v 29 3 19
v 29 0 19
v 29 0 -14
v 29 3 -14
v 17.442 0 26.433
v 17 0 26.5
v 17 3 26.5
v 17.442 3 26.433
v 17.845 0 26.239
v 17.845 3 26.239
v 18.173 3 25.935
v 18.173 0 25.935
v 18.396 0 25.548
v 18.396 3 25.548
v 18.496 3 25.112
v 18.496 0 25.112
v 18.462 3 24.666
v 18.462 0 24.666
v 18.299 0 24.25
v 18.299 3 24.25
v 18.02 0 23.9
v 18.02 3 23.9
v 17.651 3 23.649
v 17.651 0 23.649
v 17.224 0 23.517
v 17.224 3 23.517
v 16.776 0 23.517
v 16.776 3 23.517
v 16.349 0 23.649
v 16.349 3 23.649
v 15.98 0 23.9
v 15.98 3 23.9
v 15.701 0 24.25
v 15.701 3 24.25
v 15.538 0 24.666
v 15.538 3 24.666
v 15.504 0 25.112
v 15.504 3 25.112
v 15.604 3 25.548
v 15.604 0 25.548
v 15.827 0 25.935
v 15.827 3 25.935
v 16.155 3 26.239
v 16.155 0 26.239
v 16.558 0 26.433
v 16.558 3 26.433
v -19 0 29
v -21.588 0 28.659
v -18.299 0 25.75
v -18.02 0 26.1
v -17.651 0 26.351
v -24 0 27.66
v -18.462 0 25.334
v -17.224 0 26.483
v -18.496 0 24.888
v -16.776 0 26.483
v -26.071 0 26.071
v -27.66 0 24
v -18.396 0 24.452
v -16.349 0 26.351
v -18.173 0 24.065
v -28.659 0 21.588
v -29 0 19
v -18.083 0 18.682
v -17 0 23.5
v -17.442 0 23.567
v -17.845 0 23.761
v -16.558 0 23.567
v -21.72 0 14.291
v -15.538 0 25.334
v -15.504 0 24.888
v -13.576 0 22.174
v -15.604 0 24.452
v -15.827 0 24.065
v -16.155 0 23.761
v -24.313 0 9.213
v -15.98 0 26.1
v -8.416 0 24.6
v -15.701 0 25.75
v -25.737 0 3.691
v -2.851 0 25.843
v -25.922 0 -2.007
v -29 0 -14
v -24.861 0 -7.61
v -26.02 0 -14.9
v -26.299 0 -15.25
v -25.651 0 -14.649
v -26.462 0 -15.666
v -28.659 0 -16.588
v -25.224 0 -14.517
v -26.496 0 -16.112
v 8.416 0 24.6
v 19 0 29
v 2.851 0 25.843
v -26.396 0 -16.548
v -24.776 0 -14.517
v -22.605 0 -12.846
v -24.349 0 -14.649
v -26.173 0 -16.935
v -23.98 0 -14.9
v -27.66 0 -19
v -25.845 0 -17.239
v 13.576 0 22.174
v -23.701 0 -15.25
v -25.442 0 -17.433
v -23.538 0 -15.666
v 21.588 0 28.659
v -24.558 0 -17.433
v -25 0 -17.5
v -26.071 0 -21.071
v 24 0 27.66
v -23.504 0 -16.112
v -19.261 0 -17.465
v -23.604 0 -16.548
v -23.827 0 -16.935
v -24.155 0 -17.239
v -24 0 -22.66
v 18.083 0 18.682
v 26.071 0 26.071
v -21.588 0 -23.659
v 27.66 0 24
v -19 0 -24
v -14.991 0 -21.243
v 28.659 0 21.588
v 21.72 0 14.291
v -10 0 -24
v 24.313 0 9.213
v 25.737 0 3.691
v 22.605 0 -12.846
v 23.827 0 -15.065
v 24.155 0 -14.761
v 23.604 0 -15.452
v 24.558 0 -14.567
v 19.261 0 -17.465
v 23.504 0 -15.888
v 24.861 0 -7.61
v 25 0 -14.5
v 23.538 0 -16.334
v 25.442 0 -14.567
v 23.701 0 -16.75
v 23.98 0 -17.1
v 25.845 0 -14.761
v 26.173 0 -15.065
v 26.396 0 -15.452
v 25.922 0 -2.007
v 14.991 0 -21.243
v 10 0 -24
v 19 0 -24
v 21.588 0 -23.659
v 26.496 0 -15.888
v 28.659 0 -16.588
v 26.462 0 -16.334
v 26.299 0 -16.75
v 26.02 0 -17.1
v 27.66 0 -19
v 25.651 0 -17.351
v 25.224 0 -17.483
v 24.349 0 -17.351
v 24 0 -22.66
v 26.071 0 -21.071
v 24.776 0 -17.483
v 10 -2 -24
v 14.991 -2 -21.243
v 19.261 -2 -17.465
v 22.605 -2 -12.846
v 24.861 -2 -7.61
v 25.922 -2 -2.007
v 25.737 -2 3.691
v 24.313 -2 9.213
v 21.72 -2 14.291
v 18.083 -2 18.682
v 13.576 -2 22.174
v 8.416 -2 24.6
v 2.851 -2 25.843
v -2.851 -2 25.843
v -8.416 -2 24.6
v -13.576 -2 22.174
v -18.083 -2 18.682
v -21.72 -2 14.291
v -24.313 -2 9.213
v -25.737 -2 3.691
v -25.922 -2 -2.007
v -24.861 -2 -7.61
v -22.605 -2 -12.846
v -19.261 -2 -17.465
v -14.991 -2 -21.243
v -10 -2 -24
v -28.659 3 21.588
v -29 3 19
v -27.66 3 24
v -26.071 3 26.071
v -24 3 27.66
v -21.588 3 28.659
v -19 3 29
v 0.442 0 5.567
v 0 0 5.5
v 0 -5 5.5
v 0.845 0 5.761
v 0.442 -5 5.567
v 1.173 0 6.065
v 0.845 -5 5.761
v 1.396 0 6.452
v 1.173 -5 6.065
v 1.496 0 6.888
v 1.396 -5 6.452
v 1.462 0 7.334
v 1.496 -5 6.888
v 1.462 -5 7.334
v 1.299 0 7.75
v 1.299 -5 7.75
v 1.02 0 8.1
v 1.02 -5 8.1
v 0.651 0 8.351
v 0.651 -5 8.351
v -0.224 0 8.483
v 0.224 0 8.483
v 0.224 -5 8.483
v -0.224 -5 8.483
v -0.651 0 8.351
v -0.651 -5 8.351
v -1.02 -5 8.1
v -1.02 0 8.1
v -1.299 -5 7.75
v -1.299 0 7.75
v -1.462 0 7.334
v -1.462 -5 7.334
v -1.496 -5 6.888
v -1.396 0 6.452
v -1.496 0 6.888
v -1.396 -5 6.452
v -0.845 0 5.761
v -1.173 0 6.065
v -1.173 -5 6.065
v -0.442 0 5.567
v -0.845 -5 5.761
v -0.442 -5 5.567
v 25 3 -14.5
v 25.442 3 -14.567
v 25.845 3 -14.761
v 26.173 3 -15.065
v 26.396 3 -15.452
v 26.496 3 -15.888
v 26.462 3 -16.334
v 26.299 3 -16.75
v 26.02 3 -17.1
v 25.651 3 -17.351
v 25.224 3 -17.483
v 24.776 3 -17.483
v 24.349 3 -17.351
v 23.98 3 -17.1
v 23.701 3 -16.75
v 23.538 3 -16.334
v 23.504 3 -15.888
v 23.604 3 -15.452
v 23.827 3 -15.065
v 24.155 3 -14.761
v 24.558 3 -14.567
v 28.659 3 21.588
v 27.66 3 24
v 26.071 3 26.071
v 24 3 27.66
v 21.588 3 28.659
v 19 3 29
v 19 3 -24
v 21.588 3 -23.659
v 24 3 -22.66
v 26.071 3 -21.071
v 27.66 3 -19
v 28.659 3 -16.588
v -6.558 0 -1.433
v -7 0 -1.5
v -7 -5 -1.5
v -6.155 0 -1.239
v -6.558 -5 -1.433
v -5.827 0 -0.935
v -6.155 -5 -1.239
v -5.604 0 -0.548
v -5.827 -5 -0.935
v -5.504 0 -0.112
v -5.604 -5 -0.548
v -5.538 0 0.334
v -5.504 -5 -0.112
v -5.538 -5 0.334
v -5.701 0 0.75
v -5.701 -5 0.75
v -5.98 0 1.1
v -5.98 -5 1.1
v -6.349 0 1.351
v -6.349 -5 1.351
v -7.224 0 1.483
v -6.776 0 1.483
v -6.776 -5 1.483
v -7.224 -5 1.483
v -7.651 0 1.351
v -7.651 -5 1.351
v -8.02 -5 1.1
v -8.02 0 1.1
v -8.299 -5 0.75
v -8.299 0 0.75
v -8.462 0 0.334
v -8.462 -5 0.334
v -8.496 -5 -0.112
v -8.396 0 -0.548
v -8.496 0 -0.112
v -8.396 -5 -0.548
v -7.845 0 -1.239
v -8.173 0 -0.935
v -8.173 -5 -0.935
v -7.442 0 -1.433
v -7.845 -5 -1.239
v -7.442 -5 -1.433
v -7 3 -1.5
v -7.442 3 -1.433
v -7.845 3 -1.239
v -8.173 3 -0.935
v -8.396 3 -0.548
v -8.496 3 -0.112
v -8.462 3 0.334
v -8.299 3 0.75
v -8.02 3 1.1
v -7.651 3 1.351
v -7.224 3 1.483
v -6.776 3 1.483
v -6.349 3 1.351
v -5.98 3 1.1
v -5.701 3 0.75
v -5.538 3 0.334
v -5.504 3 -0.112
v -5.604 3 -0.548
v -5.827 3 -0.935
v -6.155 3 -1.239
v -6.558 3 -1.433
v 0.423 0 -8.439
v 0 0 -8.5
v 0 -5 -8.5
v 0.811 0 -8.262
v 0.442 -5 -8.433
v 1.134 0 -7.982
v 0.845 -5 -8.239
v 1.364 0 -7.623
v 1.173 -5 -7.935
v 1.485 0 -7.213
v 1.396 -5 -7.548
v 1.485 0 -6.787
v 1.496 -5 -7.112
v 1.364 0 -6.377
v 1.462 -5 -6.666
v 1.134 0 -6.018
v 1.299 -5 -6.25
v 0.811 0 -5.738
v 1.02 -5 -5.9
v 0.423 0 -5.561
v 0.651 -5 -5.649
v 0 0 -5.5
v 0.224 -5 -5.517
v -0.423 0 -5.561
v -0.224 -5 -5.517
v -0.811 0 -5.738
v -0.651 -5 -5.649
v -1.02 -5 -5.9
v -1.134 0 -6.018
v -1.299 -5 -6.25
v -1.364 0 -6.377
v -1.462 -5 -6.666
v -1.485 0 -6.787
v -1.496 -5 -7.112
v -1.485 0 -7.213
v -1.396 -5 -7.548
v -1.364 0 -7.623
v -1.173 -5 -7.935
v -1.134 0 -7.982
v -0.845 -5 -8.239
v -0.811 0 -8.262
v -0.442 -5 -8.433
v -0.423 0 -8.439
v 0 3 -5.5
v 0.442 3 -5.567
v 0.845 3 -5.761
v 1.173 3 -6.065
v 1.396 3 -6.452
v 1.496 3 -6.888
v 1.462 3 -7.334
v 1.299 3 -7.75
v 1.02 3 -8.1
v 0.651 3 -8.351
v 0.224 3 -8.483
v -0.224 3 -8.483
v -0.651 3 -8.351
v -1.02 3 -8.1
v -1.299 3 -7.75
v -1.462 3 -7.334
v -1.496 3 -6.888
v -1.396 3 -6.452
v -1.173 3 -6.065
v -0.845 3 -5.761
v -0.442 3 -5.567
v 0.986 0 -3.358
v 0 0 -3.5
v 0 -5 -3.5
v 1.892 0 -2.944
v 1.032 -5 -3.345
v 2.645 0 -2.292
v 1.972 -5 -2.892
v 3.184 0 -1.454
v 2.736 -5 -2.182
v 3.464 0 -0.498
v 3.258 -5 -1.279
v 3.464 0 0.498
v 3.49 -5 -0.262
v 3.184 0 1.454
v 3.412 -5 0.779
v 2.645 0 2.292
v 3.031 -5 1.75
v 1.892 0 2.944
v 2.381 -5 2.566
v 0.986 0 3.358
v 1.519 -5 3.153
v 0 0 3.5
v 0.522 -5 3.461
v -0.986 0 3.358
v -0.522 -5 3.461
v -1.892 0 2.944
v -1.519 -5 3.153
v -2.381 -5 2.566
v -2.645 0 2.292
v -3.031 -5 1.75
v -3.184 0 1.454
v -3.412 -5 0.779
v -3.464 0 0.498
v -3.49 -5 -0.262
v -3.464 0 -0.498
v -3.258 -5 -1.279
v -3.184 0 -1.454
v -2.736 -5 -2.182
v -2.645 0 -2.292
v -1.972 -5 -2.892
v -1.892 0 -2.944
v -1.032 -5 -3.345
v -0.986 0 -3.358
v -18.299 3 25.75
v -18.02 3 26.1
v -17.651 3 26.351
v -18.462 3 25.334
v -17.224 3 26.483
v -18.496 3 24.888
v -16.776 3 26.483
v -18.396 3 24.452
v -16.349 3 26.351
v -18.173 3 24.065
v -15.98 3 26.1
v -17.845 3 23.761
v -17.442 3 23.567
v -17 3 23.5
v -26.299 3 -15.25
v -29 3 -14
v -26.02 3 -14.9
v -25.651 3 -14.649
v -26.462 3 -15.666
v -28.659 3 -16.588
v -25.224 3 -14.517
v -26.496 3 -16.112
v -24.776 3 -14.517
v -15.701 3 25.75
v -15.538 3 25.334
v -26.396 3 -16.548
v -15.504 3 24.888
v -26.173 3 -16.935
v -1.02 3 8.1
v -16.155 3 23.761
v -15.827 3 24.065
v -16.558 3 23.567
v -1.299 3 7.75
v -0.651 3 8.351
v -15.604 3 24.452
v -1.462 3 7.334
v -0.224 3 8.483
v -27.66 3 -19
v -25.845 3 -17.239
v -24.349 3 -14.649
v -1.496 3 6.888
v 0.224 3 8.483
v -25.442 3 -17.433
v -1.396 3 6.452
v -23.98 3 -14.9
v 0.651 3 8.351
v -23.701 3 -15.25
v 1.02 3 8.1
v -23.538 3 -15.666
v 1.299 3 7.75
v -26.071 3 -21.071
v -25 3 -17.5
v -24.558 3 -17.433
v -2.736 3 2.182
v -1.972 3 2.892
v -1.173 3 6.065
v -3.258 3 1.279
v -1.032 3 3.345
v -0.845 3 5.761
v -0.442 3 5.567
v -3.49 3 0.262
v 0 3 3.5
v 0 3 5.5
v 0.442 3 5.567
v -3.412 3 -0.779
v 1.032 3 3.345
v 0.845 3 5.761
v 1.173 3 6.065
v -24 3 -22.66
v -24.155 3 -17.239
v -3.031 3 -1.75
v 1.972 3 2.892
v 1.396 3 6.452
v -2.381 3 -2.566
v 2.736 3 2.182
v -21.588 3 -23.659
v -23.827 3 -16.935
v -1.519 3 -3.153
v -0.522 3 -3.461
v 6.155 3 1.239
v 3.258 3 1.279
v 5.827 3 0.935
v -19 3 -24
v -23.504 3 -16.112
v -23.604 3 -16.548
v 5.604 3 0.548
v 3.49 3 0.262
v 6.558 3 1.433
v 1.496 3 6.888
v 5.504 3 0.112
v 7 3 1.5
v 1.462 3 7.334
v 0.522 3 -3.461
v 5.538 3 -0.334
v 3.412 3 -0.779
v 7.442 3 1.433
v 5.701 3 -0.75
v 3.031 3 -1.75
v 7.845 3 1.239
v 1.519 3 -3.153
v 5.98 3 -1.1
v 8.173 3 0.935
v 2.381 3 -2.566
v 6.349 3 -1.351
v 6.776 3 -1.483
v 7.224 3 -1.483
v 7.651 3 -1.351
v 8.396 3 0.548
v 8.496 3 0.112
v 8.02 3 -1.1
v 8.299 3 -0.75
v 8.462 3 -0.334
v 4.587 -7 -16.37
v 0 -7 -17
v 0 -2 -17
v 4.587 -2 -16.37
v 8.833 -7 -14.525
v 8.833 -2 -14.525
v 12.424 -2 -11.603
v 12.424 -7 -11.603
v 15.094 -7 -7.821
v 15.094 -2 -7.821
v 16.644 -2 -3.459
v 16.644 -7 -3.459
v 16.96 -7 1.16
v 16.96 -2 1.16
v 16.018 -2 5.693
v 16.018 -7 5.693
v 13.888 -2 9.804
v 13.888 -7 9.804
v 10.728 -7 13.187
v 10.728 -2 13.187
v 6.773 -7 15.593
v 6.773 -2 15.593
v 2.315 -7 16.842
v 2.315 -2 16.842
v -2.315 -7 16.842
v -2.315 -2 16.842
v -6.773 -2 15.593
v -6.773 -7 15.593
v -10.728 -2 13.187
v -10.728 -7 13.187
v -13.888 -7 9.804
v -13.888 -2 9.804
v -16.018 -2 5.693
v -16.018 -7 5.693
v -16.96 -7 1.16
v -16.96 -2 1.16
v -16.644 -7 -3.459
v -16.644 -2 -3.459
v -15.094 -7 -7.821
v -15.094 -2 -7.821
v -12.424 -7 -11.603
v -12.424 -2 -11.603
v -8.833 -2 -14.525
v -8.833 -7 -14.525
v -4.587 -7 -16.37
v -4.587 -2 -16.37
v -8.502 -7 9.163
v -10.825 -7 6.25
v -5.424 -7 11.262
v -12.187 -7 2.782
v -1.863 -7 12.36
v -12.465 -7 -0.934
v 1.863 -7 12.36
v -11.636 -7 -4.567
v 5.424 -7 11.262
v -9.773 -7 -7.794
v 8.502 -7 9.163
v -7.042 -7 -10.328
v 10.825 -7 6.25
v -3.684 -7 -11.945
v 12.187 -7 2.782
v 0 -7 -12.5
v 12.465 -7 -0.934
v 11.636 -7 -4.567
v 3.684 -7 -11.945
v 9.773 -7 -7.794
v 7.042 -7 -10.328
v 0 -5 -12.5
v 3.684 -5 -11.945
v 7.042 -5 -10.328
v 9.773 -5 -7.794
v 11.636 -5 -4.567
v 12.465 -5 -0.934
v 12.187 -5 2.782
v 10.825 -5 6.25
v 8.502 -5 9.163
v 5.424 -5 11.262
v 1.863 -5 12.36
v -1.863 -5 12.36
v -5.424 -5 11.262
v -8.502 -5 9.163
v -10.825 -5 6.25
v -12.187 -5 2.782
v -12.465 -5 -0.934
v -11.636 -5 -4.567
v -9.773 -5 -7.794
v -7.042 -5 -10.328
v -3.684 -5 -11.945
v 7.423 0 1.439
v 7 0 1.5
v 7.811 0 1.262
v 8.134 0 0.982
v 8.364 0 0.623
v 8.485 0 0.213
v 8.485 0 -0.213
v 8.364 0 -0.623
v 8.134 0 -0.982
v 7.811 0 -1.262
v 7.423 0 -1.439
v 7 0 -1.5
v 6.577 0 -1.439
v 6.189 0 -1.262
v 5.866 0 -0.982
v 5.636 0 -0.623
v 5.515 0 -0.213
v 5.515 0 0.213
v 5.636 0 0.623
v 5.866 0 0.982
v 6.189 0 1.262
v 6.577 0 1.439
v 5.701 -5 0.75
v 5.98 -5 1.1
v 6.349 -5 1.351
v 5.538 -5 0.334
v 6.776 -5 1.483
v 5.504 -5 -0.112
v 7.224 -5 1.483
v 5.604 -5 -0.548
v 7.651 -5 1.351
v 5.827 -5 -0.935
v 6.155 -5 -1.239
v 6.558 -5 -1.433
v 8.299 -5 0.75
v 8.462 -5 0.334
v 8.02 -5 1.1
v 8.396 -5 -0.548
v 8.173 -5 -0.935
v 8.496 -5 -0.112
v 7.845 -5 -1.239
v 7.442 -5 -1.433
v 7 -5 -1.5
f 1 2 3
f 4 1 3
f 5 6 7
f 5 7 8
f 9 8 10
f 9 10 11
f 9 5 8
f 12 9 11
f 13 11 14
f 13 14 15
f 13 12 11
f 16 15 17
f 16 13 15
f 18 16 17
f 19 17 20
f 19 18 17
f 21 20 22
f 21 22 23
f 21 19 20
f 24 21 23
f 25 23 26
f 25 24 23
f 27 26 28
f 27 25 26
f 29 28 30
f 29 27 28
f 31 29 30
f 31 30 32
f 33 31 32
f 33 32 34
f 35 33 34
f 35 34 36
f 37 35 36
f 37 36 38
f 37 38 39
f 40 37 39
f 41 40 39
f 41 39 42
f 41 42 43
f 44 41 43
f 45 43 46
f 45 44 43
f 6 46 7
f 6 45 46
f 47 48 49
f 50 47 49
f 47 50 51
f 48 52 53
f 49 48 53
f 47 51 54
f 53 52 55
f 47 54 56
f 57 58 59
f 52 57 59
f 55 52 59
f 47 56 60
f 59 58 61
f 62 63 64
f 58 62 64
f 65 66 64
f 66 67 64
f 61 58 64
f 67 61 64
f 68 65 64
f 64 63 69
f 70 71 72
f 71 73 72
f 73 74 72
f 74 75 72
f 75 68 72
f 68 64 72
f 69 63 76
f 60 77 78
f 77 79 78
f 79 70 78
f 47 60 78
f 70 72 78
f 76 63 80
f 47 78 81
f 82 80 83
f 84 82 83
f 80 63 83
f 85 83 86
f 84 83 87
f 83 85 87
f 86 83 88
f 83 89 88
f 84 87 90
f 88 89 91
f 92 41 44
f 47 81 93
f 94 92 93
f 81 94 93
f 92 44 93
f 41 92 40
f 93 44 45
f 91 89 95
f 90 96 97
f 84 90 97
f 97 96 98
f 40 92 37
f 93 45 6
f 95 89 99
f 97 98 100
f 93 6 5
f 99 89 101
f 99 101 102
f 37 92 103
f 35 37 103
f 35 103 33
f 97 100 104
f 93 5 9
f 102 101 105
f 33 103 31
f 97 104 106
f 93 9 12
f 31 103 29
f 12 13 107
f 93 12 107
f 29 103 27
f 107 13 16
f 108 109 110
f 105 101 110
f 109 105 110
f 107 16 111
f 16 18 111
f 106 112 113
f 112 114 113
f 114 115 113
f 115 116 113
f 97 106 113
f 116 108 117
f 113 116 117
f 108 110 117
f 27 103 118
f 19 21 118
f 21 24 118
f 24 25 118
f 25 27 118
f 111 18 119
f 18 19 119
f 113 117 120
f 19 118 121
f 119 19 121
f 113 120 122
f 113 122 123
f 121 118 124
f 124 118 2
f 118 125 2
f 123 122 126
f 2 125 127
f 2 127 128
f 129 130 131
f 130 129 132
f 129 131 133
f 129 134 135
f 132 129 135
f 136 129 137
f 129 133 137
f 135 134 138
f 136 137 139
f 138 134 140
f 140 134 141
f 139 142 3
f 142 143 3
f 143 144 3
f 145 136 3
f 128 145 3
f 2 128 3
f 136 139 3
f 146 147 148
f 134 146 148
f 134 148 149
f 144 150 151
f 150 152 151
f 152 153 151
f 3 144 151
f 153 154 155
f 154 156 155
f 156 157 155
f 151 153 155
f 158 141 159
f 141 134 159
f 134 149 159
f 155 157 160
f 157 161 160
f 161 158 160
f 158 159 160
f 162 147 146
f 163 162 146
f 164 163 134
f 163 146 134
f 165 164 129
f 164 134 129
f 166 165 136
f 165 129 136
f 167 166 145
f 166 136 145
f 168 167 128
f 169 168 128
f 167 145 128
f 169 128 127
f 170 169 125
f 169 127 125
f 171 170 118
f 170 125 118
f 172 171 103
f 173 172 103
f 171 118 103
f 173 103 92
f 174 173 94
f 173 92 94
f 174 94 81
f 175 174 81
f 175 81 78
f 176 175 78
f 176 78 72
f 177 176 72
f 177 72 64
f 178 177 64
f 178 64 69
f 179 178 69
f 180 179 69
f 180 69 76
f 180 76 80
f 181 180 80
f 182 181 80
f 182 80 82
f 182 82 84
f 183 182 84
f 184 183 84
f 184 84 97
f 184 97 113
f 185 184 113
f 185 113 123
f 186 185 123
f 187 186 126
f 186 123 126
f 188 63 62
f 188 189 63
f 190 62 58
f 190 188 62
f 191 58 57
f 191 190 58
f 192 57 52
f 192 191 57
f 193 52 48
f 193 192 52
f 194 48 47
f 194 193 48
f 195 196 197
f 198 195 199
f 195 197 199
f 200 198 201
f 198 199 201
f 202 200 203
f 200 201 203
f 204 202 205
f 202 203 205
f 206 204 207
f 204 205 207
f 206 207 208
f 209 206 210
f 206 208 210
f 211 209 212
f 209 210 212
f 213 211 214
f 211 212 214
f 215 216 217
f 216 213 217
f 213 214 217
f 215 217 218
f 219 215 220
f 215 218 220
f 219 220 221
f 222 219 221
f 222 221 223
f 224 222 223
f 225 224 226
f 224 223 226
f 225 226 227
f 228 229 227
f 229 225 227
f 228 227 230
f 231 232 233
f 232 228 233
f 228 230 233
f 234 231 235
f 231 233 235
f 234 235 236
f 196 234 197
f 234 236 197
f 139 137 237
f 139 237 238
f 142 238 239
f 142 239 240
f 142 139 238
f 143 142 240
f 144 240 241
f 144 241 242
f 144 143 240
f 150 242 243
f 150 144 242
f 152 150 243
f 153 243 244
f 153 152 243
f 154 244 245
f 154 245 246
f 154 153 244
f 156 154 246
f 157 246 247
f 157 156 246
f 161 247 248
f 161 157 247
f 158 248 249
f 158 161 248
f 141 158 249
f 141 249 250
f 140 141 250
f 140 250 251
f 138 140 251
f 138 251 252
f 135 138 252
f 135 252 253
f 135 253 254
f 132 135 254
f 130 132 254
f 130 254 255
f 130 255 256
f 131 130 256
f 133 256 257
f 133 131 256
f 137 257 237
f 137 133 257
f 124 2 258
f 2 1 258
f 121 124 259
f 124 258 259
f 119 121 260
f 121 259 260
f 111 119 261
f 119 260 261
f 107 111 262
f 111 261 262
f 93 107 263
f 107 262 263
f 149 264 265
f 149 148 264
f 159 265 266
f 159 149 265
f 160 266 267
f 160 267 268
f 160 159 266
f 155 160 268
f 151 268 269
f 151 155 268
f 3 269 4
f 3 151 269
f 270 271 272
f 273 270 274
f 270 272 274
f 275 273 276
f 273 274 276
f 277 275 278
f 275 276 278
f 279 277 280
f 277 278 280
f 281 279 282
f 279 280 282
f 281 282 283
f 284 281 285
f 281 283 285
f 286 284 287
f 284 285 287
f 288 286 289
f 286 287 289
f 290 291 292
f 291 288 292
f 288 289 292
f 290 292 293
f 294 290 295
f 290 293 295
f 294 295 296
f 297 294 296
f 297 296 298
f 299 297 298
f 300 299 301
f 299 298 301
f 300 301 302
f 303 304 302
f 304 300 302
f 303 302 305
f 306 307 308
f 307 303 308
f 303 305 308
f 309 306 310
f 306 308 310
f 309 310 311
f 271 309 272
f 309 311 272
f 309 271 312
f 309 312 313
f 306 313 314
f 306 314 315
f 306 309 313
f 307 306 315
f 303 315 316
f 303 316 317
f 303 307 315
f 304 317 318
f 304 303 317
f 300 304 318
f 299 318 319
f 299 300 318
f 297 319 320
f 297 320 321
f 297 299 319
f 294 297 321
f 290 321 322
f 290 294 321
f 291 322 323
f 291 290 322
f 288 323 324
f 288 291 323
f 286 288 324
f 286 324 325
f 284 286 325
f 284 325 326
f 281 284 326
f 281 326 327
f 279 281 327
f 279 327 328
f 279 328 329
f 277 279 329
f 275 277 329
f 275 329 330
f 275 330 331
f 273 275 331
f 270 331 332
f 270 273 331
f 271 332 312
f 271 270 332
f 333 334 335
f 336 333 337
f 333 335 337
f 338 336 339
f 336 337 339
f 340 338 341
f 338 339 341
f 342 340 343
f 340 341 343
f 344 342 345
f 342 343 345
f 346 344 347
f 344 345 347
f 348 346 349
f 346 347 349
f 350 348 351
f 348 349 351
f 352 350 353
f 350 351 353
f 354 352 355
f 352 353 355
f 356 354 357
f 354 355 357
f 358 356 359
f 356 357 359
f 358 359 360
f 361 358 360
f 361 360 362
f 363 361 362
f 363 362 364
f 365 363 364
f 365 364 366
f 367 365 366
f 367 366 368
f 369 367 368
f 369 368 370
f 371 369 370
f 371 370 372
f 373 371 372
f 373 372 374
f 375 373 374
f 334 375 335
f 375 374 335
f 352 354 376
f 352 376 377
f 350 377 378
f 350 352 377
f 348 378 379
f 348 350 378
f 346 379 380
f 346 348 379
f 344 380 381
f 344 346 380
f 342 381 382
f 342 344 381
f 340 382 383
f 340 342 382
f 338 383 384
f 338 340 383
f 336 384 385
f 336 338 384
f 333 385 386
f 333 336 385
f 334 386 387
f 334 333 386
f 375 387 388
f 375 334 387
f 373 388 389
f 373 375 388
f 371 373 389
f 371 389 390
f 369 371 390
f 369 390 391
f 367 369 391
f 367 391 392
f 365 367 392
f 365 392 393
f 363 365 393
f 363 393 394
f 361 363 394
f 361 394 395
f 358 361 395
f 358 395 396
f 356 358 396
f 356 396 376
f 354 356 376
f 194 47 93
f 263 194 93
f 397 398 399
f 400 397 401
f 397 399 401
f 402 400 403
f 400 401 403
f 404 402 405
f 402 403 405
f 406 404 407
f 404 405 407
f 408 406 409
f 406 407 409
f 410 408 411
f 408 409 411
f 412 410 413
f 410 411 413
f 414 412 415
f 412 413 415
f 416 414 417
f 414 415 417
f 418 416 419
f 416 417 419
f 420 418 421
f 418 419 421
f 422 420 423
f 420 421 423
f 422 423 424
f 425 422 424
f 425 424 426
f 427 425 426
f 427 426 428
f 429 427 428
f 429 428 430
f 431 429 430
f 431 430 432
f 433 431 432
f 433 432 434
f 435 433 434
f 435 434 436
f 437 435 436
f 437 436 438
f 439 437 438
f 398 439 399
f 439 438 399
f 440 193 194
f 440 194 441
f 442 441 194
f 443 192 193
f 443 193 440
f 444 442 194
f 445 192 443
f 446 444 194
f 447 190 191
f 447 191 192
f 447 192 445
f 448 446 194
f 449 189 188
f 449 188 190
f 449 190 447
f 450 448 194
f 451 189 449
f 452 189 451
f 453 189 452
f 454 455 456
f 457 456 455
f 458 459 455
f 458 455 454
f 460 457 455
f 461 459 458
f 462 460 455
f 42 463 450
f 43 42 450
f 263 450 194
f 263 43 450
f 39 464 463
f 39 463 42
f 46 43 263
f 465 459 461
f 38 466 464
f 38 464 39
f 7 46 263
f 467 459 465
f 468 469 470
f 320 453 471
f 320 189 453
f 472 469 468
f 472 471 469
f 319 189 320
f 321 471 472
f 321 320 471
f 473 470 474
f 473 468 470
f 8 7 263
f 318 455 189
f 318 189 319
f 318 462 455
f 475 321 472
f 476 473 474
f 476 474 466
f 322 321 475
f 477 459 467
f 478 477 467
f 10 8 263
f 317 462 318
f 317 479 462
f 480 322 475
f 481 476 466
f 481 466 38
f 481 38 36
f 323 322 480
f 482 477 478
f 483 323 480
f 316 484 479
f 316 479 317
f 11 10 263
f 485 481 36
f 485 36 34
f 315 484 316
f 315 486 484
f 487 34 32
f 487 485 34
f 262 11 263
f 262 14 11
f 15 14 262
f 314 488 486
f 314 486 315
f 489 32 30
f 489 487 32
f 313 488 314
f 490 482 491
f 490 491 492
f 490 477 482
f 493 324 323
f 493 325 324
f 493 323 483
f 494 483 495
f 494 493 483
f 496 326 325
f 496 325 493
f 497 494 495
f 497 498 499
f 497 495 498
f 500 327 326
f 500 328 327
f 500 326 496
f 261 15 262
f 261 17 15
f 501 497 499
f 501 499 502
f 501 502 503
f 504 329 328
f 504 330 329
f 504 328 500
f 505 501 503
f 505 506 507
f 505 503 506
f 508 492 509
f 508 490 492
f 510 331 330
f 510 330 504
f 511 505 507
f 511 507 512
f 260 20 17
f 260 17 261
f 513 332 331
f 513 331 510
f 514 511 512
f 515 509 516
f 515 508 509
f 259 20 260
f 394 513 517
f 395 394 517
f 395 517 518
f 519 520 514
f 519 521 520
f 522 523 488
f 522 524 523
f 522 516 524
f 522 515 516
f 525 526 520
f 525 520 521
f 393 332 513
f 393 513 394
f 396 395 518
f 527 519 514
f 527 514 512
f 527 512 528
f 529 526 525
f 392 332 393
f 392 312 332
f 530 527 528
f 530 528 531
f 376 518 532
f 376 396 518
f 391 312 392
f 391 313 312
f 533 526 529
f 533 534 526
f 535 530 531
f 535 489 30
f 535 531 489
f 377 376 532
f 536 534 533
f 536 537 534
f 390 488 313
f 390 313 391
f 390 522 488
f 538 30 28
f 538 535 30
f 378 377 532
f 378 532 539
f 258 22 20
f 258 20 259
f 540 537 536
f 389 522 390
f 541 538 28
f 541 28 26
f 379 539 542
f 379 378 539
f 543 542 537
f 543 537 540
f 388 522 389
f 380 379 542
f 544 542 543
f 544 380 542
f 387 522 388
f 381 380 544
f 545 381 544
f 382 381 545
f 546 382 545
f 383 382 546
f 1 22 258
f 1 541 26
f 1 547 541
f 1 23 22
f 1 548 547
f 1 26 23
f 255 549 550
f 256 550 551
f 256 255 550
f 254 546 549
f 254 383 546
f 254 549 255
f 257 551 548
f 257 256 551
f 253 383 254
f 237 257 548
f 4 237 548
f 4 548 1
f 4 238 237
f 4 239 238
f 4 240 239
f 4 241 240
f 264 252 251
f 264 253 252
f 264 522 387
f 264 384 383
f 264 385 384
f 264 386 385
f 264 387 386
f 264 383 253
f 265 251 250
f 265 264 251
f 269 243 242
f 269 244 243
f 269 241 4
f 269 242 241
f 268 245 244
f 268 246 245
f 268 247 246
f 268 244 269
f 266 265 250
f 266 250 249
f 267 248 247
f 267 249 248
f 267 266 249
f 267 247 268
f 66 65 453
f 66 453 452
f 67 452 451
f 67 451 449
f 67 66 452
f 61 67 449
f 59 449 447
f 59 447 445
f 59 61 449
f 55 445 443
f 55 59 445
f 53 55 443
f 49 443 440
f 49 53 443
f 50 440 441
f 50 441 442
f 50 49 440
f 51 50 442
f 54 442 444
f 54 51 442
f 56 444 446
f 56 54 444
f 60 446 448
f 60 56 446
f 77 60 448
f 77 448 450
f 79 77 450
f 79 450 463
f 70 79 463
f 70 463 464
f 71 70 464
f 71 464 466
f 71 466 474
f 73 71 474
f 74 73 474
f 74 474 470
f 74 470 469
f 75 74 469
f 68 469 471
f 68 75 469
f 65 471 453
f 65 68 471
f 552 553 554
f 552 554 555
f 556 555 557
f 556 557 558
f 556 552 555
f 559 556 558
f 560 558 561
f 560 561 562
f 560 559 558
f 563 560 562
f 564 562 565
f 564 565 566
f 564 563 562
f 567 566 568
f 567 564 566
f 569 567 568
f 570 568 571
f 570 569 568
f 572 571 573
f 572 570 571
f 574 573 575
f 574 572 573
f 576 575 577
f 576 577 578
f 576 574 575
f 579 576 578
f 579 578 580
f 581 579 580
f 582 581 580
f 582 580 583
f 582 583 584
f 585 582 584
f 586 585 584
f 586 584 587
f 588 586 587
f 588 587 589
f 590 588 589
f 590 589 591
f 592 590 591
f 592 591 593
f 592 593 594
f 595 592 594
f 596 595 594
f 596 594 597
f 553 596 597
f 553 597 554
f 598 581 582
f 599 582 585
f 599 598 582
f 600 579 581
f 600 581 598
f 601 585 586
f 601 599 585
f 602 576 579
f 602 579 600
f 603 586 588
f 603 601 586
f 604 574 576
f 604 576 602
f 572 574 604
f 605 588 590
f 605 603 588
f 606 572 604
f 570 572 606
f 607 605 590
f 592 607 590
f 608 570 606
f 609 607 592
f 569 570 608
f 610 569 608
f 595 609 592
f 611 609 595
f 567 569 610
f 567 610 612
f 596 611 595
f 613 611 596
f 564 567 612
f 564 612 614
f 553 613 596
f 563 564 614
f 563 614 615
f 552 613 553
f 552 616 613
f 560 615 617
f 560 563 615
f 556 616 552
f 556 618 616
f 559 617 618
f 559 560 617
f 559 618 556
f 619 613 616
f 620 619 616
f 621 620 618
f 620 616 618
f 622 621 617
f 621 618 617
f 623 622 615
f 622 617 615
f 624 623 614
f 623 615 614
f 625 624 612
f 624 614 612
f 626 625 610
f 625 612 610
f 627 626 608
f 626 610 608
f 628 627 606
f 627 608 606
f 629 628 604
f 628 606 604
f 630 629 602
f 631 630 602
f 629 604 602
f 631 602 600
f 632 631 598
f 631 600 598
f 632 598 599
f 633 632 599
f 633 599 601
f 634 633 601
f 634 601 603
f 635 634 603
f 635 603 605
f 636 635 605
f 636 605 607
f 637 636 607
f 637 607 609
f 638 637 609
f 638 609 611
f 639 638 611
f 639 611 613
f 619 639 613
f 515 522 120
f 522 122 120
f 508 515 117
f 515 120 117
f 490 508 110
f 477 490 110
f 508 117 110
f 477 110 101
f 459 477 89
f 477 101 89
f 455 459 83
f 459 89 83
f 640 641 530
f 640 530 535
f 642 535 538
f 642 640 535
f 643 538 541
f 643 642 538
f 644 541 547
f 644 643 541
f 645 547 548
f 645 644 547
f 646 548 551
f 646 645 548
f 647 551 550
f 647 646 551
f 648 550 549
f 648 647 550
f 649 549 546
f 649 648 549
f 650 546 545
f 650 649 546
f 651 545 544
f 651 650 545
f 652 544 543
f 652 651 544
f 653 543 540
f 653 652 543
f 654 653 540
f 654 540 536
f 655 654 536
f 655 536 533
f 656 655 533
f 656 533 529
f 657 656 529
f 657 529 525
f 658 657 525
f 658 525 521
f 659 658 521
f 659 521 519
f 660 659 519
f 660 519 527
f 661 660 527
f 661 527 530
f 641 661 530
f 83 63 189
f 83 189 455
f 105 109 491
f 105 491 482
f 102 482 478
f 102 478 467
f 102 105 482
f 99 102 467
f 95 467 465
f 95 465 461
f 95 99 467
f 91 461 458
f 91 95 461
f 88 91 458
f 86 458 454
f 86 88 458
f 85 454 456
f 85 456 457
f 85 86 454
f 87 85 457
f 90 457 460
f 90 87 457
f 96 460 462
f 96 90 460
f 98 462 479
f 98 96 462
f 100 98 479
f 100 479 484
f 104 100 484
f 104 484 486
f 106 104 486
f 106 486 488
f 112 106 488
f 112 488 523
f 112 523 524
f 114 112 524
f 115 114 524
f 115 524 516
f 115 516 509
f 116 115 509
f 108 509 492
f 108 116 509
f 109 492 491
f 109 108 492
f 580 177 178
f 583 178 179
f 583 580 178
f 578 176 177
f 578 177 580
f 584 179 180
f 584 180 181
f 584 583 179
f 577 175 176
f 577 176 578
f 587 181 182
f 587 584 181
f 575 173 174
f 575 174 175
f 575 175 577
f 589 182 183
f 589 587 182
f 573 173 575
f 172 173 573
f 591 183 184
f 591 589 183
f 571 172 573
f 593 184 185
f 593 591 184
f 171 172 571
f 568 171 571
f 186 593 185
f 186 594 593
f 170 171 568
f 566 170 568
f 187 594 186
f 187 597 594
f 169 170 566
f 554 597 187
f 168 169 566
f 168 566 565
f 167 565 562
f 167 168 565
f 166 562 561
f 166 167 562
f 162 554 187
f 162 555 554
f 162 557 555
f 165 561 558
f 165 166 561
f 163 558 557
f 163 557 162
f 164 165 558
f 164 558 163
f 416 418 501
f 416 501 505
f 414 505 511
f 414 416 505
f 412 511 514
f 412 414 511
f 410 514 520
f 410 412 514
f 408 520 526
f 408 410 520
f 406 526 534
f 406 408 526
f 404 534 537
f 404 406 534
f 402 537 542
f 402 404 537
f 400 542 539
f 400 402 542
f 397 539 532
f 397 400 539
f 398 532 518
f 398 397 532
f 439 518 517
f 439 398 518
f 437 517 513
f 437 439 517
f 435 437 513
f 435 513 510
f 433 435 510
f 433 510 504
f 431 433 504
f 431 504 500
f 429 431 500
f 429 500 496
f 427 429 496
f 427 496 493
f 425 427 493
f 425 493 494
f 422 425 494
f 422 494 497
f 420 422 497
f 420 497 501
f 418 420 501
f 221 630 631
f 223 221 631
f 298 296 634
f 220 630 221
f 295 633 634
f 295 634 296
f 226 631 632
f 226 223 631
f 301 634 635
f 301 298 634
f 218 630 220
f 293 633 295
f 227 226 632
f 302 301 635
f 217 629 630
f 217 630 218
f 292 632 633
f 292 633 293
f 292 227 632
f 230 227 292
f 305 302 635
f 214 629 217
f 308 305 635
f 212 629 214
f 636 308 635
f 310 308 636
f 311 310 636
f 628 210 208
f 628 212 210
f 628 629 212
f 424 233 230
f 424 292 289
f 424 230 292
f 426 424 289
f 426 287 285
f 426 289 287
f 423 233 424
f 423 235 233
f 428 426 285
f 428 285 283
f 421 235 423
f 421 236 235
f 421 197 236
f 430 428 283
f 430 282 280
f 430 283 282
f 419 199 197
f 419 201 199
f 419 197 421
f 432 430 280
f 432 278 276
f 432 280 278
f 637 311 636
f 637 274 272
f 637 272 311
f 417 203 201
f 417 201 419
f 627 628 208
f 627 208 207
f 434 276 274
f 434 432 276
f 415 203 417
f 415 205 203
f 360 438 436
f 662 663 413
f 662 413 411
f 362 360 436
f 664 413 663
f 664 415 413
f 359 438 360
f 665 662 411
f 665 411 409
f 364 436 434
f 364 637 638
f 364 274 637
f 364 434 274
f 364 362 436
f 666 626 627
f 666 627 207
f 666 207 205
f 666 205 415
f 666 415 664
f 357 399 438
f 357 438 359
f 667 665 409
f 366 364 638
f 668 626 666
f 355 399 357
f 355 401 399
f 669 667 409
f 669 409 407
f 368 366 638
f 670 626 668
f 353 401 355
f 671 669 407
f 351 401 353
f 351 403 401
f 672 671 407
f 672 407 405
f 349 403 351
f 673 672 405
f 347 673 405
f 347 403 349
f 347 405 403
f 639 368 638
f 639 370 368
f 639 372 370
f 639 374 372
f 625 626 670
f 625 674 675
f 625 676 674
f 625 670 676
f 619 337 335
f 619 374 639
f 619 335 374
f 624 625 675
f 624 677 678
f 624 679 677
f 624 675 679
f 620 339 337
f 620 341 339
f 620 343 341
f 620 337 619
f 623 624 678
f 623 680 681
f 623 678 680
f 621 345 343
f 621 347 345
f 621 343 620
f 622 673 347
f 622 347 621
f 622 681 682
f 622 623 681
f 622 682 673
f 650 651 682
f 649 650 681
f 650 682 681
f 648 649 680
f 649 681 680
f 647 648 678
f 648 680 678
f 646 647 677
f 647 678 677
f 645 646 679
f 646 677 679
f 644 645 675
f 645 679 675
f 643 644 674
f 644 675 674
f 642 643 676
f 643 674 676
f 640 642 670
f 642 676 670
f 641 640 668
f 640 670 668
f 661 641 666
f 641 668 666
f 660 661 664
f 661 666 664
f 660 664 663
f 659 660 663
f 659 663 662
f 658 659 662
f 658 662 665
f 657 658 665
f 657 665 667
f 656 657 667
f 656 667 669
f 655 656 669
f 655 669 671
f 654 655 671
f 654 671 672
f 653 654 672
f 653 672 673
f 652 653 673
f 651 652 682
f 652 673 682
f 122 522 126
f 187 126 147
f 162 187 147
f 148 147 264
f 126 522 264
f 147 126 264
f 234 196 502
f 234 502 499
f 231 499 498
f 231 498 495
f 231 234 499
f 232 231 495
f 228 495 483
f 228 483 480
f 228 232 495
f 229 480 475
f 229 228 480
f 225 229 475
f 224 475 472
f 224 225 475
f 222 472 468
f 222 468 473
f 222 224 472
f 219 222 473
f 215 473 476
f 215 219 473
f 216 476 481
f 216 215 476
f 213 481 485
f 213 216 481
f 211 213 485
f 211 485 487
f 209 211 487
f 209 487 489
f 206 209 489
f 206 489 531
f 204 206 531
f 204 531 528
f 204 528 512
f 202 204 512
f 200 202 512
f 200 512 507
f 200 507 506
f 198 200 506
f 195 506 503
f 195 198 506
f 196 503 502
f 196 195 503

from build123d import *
from build123d.topology import SkipClean

# Parameters (mm, degrees)
SKETCH_1_W          = 58
SKETCH_1_H          = 58
SKETCH_1_R          = 1.5
SKETCH_1_R_2        = 3.5
EXTRUDE_1_DEPTH     = 3
EXTRUDE_START       = 5
SKETCH_2_R          = 12.5
SKETCH_2_R_2        = 1.5
SKETCH_2_R_3        = 3.5
EXTRUDE_2_DEPTH     = 5
EXTRUDE_START_2     = 7
SKETCH_6_R          = 17
SKETCH_6_R_2        = 12.5
EXTRUDE_3_DEPTH     = 7
SKETCH_8_R          = 26
SKETCH_8_R_2        = 12
EXTRUDE_5_DEPTH     = 2
SKETCH_10_W         = 58
SKETCH_10_H         = 5
CUT_EXTRUDE_1_DEPTH = 10
FILLET_1_R          = 10


with BuildPart() as part:
    # 草图1 → 凸台-拉伸1 (new body)
    with BuildSketch(Plane(origin=(0, 0, 0), x_dir=(1, 0, 0), z_dir=(0, 1, 0))):
        Rectangle(SKETCH_1_W, SKETCH_1_H)
        with Locations(Location((0, 7, 0), (0, 0, 270))):
            Circle(SKETCH_1_R, mode=Mode.SUBTRACT)
        with Locations(Location((7, 0, 0), (0, 0, 270))):
            Circle(SKETCH_1_R, mode=Mode.SUBTRACT)
        with Locations(Location((0, 0, 0), (0, 0, 270))):
            Circle(SKETCH_1_R_2, mode=Mode.SUBTRACT)
        with Locations(Location((0, -7, 0), (0, 0, 90))):
            Circle(SKETCH_1_R, mode=Mode.SUBTRACT)
        with Locations(Location((-7, 0, 0), (0, 0, 90))):
            Circle(SKETCH_1_R, mode=Mode.SUBTRACT)
        with Locations(Location((25, 16, 0), (0, 0, 270))):
            Circle(SKETCH_1_R, mode=Mode.SUBTRACT)
        with Locations(Location((-25, 16, 0), (0, 0, 90))):
            Circle(SKETCH_1_R, mode=Mode.SUBTRACT)
        with Locations(Location((17, -25, 0), (0, 0, 270))):
            Circle(SKETCH_1_R, mode=Mode.SUBTRACT)
        with Locations(Location((-17, -25, 0), (0, 0, 90))):
            Circle(SKETCH_1_R, mode=Mode.SUBTRACT)
    extrude(amount=EXTRUDE_1_DEPTH)

    # 草图2 → 凸台-拉伸2 (add)
    with SkipClean():  # the faces are left unmerged after this step: merging them gives an invalid solid
        with BuildSketch(Plane.XZ.offset(EXTRUDE_START)):
            with Locations(Location((0, 0, 0), (0, 0, 270))):
                Circle(SKETCH_2_R)
            with Locations(Location((0, 7, 0), (0, 0, 270))):
                Circle(SKETCH_2_R_2, mode=Mode.SUBTRACT)
            with Locations(Location((0, 0, 0), (0, 0, 270))):
                Circle(SKETCH_2_R_3, mode=Mode.SUBTRACT)
            with Locations(Location((-7, 0, 0), (0, 0, 270))):
                Circle(SKETCH_2_R_2, mode=Mode.SUBTRACT)
            with Locations(Location((0, -7, 0), (0, 0, 270))):
                Circle(SKETCH_2_R_2, mode=Mode.SUBTRACT)
            with Locations(Location((7, 0, 0), (0, 0, 270))):
                Circle(SKETCH_2_R_2, mode=Mode.SUBTRACT)
        extrude(amount=-EXTRUDE_2_DEPTH)

    # 草图6 → 凸台-拉伸3 (add)
    with SkipClean():  # the faces are left unmerged after this step: merging them gives an invalid solid
        with BuildSketch(Plane.XZ.offset(EXTRUDE_START_2)):
            with Locations(Location((0, 0, 0), (0, 0, 270))):
                Circle(SKETCH_6_R)
            with Locations(Location((0, 0, 0), (0, 0, 270))):
                Circle(SKETCH_6_R_2, mode=Mode.SUBTRACT)
        extrude(amount=-EXTRUDE_3_DEPTH)

    # 草图8 → 凸台-拉伸5 (add)
    with SkipClean():  # the faces are left unmerged after this step: merging them gives an invalid solid
        with BuildSketch(Plane.XZ):
            with Locations(Location((0, 0, 0), (0, 0, 270))):
                Circle(SKETCH_8_R)
            Circle(SKETCH_8_R_2, mode=Mode.SUBTRACT)
        extrude(amount=EXTRUDE_5_DEPTH)

    # 草图10 → 切除-拉伸1 (cut)
    with BuildSketch(Plane(origin=(0, 3, 0), x_dir=(1, 0, 0), z_dir=(0, 1, 0))):
        with Locations((0, 26.5)):
            Rectangle(SKETCH_10_W, SKETCH_10_H)
    extrude(amount=-CUT_EXTRUDE_1_DEPTH, mode=Mode.SUBTRACT)

    # 圆角1
    fillet_1_edges = [part.edges().sort_by_distance(p)[0] for p in [
        (29, 1.5, 29),
        (-29, 1.5, 29),
        (29, 1.5, -24),
        (-29, 1.5, -24),
    ]]
    fillet(fillet_1_edges, radius=FILLET_1_R)


solid = part.part
